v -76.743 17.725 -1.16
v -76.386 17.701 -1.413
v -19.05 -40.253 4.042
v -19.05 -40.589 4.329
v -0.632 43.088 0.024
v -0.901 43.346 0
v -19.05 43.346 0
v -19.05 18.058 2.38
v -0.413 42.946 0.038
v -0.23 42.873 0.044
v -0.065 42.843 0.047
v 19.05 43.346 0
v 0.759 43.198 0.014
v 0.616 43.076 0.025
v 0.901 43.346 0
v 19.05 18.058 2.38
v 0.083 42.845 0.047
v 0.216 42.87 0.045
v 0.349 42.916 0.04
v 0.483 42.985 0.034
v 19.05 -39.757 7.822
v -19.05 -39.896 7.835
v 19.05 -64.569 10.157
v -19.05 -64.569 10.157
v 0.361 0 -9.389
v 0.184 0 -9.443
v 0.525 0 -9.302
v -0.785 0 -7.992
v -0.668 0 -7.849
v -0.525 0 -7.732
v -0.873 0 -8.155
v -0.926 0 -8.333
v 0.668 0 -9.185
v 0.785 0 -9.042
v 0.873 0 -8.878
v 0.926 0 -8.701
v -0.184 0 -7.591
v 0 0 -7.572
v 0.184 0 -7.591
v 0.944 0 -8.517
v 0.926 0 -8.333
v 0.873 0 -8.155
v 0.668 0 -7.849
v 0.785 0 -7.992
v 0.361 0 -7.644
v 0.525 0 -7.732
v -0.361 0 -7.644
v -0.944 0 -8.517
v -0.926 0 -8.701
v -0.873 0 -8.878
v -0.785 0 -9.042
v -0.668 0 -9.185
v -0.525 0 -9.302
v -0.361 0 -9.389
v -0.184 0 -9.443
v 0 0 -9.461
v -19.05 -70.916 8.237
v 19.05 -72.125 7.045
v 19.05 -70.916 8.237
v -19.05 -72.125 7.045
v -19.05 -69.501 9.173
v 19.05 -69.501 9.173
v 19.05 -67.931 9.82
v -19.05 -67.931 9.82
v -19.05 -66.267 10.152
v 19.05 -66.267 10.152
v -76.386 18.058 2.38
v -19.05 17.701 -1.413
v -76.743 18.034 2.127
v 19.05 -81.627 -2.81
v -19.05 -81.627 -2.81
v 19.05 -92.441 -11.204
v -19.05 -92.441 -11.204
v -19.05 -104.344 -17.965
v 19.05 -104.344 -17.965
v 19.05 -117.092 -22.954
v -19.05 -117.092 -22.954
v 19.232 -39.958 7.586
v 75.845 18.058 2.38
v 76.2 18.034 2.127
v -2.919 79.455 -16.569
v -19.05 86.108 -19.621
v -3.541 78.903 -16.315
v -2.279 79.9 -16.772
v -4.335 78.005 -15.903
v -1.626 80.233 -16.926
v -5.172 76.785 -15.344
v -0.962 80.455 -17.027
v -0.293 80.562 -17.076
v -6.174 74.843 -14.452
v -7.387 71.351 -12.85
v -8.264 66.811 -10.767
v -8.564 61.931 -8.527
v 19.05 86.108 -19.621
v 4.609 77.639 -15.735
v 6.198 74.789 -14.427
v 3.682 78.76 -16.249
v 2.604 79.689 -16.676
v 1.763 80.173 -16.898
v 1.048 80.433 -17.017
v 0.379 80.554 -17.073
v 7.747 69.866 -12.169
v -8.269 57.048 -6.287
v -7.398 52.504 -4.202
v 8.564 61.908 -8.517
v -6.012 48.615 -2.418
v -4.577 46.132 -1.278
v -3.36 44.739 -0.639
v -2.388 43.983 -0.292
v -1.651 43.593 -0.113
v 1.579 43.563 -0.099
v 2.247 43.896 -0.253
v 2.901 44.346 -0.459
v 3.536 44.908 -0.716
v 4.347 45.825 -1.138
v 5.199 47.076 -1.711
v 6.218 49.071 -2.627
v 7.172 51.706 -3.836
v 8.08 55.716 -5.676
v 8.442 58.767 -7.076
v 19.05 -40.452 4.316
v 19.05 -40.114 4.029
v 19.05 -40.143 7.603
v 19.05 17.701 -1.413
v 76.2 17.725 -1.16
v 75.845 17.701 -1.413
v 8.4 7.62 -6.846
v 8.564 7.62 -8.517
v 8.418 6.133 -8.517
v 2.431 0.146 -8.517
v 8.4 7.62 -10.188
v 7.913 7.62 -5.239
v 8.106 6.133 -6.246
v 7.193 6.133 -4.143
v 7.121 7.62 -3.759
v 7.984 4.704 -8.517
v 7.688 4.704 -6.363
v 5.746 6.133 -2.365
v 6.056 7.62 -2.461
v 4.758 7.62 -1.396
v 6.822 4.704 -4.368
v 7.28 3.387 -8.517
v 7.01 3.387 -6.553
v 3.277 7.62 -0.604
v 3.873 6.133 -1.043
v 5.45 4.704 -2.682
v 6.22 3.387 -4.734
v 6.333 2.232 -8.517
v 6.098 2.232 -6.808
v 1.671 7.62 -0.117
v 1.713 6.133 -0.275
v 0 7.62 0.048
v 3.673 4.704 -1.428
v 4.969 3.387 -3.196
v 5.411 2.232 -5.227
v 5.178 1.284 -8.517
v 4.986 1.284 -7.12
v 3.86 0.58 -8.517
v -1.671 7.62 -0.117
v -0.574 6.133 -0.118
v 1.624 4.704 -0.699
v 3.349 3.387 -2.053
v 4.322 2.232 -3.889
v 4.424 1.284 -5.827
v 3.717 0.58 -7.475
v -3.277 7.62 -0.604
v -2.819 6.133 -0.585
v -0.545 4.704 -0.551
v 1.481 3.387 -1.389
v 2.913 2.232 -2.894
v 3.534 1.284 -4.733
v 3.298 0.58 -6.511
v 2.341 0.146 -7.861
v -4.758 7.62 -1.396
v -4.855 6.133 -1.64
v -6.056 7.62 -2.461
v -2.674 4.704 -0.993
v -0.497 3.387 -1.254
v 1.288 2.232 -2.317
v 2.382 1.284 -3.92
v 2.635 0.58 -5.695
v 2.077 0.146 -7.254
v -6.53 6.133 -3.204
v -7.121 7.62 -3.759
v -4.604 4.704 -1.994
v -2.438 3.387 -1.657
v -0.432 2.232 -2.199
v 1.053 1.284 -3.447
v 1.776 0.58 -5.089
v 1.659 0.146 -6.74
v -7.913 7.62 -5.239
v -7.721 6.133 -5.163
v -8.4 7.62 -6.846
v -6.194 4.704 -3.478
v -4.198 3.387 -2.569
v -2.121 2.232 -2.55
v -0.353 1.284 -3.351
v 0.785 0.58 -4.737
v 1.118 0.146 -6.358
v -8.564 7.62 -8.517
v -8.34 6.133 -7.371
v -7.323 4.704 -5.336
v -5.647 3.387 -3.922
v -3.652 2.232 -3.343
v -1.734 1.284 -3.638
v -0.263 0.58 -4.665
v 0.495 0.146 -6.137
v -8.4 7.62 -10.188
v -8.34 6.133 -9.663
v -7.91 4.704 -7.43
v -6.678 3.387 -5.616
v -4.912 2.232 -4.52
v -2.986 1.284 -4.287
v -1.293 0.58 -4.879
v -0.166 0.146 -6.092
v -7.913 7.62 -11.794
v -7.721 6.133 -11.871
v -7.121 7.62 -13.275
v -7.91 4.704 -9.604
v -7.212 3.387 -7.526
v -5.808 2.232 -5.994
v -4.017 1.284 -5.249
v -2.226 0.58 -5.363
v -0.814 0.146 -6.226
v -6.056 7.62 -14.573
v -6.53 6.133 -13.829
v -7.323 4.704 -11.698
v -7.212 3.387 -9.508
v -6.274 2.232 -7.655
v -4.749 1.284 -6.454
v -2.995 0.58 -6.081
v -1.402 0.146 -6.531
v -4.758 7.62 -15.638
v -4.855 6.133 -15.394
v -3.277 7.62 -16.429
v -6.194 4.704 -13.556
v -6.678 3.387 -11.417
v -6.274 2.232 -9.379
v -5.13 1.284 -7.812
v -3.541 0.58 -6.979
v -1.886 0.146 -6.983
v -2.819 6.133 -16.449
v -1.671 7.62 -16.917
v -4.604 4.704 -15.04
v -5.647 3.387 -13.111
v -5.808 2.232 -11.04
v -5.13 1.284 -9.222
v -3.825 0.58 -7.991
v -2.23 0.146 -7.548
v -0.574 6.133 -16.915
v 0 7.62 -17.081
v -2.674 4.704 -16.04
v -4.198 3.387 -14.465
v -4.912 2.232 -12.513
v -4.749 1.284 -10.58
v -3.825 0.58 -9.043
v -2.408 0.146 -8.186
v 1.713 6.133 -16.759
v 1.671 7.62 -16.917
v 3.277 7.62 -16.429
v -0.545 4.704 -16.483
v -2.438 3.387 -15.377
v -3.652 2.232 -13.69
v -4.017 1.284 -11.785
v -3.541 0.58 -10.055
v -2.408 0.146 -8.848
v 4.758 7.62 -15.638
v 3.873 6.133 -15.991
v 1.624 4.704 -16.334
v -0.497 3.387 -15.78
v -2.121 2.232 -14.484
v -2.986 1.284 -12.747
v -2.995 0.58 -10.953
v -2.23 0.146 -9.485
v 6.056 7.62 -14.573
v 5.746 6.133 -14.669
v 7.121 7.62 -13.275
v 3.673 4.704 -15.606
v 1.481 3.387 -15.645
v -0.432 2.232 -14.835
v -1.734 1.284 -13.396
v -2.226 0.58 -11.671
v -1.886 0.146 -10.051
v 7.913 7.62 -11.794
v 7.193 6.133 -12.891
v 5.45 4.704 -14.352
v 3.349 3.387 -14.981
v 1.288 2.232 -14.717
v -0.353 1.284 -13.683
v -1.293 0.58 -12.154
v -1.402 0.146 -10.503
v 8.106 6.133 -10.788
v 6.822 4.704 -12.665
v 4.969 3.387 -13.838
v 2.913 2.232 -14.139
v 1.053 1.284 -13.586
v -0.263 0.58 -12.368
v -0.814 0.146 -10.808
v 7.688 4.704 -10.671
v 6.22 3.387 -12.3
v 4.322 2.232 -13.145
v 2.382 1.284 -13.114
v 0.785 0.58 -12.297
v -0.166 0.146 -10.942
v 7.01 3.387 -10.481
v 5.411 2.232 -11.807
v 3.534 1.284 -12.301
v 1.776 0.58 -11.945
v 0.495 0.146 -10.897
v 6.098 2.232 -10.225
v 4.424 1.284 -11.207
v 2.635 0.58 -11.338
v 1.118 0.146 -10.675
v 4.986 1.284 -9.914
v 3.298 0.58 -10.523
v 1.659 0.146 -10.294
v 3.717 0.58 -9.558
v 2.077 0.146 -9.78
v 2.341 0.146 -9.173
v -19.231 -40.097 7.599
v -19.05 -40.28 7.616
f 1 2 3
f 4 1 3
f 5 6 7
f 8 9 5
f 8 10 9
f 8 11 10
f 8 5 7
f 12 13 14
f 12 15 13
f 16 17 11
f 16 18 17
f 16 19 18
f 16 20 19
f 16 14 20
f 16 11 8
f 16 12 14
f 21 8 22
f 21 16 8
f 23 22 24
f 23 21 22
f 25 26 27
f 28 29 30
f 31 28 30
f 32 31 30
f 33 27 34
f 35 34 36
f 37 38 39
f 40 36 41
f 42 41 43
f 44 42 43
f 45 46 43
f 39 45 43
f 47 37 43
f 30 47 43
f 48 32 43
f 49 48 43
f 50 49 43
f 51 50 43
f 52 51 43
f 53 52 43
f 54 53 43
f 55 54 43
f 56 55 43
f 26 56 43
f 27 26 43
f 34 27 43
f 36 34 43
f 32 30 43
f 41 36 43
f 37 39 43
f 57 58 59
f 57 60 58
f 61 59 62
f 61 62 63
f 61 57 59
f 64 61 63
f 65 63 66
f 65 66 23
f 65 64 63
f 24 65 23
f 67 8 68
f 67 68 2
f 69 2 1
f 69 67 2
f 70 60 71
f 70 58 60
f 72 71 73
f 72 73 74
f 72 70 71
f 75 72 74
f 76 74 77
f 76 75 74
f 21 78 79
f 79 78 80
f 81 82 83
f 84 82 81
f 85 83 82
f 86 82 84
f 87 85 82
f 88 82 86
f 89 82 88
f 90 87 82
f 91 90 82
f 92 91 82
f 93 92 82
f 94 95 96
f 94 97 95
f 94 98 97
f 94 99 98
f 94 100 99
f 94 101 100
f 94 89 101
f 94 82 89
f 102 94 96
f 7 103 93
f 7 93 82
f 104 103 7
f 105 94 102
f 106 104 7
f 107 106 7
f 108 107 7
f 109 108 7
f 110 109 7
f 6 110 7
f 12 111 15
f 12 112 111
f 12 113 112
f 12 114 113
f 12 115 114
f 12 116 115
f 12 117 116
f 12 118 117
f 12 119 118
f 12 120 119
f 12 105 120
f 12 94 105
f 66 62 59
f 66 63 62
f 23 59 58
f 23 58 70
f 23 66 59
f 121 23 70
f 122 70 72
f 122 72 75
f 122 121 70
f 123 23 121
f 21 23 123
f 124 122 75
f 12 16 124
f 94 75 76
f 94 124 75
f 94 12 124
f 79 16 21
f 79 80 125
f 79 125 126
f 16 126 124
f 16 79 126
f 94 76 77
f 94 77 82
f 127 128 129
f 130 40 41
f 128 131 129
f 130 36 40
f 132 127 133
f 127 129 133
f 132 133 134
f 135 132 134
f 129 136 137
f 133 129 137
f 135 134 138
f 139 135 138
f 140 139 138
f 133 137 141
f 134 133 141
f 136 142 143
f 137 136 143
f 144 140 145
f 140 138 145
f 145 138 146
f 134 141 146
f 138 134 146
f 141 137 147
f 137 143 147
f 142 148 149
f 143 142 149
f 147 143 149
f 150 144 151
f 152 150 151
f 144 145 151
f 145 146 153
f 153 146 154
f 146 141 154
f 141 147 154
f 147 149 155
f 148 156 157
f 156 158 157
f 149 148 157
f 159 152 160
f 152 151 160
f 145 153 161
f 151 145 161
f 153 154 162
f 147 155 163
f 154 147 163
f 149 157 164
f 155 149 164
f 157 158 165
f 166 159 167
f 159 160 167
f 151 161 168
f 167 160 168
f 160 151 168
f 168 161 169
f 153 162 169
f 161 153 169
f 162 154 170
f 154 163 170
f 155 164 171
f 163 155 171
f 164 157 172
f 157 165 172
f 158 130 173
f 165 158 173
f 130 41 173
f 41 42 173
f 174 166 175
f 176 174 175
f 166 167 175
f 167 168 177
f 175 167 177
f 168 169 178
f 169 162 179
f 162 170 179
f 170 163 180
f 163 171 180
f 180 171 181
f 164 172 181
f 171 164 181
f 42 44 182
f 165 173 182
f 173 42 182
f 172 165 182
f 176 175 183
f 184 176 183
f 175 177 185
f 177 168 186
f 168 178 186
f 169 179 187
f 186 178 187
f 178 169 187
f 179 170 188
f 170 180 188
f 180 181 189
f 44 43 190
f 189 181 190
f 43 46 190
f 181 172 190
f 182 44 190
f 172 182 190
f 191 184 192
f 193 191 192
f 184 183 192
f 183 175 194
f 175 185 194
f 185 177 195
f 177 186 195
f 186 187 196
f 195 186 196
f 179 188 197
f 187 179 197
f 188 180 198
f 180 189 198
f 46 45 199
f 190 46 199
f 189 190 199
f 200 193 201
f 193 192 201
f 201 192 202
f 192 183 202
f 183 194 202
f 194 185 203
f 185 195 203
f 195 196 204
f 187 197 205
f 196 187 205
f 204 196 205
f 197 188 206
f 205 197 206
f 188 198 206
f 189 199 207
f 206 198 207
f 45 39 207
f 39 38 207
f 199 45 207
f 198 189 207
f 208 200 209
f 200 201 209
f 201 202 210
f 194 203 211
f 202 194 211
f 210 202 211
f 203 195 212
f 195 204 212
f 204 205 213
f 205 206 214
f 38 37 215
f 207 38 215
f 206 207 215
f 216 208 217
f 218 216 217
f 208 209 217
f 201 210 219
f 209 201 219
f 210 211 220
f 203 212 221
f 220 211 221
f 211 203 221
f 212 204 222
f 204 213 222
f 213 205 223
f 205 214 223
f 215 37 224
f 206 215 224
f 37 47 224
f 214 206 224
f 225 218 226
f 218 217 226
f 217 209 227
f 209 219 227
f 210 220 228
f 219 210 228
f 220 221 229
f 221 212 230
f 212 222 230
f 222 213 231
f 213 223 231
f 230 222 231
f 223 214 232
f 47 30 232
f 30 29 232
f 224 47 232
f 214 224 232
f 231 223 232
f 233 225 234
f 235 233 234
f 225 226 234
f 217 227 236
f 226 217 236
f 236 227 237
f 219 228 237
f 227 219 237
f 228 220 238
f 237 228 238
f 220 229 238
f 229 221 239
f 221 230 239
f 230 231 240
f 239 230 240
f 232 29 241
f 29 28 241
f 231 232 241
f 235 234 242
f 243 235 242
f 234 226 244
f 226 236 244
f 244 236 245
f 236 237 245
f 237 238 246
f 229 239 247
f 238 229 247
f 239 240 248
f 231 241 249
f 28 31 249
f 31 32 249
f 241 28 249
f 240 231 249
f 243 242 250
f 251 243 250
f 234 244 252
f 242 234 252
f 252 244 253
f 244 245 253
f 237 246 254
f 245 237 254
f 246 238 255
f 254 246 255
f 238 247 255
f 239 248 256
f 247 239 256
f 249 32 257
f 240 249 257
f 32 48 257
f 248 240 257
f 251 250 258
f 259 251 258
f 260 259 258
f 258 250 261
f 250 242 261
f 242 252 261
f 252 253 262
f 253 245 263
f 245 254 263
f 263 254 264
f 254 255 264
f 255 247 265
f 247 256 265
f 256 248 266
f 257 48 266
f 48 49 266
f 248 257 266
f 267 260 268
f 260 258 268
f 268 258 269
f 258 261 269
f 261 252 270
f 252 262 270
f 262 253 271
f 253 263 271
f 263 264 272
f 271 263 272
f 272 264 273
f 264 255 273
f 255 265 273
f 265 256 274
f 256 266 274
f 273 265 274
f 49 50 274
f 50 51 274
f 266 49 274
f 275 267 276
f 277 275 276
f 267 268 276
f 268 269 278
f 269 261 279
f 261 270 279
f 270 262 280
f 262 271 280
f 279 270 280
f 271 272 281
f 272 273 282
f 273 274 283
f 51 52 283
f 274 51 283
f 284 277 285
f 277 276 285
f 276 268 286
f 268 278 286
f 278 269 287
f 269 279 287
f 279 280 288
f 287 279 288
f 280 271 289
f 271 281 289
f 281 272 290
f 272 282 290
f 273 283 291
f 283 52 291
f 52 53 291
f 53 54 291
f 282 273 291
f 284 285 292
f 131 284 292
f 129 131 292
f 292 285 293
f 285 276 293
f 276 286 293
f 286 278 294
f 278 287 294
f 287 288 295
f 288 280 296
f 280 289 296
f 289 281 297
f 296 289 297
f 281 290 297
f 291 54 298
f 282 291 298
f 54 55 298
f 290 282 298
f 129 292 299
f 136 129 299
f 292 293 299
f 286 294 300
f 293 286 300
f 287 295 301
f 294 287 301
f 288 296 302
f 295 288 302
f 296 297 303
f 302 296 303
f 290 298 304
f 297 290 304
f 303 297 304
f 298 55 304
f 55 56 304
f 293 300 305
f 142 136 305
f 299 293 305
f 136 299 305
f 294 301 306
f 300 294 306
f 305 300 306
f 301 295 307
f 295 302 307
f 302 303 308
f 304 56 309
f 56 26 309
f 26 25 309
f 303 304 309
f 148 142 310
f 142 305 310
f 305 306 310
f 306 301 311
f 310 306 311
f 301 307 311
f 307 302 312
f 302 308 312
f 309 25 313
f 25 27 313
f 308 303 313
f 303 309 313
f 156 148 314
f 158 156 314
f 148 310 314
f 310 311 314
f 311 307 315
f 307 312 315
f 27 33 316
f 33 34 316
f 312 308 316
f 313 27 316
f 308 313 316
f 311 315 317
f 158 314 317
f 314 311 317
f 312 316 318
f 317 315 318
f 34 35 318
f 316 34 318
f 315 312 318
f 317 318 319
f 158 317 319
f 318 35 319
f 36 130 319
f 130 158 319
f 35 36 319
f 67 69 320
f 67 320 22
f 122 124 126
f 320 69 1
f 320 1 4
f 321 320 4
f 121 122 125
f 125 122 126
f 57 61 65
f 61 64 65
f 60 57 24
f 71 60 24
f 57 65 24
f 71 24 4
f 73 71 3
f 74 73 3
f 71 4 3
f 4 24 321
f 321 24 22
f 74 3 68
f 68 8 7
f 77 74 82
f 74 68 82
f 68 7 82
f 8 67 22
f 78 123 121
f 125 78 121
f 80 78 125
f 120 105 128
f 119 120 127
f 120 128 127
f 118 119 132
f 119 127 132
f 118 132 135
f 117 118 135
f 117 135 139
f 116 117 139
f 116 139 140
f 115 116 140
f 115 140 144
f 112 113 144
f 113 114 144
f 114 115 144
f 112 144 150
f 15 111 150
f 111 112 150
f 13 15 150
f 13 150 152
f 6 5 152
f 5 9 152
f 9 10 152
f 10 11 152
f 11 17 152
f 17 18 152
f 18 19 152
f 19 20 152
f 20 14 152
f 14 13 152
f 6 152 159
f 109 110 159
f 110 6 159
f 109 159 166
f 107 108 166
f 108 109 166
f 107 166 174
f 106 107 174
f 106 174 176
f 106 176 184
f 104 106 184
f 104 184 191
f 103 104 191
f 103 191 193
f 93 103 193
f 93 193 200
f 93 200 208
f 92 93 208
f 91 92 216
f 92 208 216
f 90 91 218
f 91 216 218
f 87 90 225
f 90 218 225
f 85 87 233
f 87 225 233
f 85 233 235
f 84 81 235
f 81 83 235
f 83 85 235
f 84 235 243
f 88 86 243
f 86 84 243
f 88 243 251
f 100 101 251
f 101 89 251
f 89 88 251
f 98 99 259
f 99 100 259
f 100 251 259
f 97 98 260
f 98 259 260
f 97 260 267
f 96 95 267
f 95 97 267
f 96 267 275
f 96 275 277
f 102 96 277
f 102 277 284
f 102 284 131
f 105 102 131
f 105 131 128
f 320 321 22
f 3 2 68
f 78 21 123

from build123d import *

# Parameters (mm, degrees)
F1_DEPTH      = 19.05
F1_DEPTH_BACK = 19.05
F2_R          = 8.7708682623
F4_DEPTH      = 3.81
F5_SIZE       = 0.254
F6_R          = 8.5644348715
F7_DEPTH      = 131.826
F8_R          = 7.62


with BuildPart() as f1:
    # F0 (on Right) → F1 (new body, two sides)
    with BuildSketch(Plane.YZ) as f1_sk:
        with BuildLine():
            ThreePointArc((-69.297126121, 10.6023983714), (-90.5654400371, -9.9203811878), (-117.0916636607, -22.9543797277))
            Line((-117.0916636607, -22.9543797277), (86.1083363393, -19.6213065932))
            Line((86.1083363393, -19.6213065932), (43.3460188102, 0))
            Line((43.3460188102, 0), (-69.297126121, 10.6023983714))
        make_face()
    extrude(amount=F1_DEPTH)
    extrude(f1_sk.sketch, amount=-F1_DEPTH_BACK)

    # F2
    f2_edges = [f1.edges().sort_by_distance(p)[0] for p in [
        (0, -69.297126, 10.602398),
    ]]
    fillet(f2_edges, radius=F2_R)

    # F3 (on face) → F4 (join)
    with BuildSketch(Plane(origin=(0, 0.380642539, 4.0440635396), x_dir=(1, 0, 0), z_dir=(0, 0.0937095933, 0.9955995742))):
        Polygon((-76.7426812672, 17.75527787), (0, -60.1567947547), (0, 17.75527787), align=None)
        Polygon((0, 17.75527787), (0, -60.1567947547), (76.2, 17.75527787), align=None)
    extrude(amount=-F4_DEPTH)

    # F5
    f5_edges = [f1.edges().sort_by_distance(p)[0] for p in [
        (47.625, -11.387704, 1.324905),
        (47.625, -11.03067, 5.118139),
        (-47.896341, -11.099236, 5.124593),
        (-47.896341, -11.45627, 1.331359),
    ]]
    chamfer(f5_edges, length=F5_SIZE)

    # F6 (on Front) → F7 (cut)
    with BuildSketch(Plane.XZ):
        with Locations((0, -8.5168717217)):
            Circle(F6_R)
    extrude(amount=-F7_DEPTH, mode=Mode.SUBTRACT)

    # F8
    f8_edges = [f1.edges().sort_by_distance(p)[0] for p in [
        (-8.564435, 0, -8.516872),
    ]]
    fillet(f8_edges, radius=F8_R)


solid = f1.part
